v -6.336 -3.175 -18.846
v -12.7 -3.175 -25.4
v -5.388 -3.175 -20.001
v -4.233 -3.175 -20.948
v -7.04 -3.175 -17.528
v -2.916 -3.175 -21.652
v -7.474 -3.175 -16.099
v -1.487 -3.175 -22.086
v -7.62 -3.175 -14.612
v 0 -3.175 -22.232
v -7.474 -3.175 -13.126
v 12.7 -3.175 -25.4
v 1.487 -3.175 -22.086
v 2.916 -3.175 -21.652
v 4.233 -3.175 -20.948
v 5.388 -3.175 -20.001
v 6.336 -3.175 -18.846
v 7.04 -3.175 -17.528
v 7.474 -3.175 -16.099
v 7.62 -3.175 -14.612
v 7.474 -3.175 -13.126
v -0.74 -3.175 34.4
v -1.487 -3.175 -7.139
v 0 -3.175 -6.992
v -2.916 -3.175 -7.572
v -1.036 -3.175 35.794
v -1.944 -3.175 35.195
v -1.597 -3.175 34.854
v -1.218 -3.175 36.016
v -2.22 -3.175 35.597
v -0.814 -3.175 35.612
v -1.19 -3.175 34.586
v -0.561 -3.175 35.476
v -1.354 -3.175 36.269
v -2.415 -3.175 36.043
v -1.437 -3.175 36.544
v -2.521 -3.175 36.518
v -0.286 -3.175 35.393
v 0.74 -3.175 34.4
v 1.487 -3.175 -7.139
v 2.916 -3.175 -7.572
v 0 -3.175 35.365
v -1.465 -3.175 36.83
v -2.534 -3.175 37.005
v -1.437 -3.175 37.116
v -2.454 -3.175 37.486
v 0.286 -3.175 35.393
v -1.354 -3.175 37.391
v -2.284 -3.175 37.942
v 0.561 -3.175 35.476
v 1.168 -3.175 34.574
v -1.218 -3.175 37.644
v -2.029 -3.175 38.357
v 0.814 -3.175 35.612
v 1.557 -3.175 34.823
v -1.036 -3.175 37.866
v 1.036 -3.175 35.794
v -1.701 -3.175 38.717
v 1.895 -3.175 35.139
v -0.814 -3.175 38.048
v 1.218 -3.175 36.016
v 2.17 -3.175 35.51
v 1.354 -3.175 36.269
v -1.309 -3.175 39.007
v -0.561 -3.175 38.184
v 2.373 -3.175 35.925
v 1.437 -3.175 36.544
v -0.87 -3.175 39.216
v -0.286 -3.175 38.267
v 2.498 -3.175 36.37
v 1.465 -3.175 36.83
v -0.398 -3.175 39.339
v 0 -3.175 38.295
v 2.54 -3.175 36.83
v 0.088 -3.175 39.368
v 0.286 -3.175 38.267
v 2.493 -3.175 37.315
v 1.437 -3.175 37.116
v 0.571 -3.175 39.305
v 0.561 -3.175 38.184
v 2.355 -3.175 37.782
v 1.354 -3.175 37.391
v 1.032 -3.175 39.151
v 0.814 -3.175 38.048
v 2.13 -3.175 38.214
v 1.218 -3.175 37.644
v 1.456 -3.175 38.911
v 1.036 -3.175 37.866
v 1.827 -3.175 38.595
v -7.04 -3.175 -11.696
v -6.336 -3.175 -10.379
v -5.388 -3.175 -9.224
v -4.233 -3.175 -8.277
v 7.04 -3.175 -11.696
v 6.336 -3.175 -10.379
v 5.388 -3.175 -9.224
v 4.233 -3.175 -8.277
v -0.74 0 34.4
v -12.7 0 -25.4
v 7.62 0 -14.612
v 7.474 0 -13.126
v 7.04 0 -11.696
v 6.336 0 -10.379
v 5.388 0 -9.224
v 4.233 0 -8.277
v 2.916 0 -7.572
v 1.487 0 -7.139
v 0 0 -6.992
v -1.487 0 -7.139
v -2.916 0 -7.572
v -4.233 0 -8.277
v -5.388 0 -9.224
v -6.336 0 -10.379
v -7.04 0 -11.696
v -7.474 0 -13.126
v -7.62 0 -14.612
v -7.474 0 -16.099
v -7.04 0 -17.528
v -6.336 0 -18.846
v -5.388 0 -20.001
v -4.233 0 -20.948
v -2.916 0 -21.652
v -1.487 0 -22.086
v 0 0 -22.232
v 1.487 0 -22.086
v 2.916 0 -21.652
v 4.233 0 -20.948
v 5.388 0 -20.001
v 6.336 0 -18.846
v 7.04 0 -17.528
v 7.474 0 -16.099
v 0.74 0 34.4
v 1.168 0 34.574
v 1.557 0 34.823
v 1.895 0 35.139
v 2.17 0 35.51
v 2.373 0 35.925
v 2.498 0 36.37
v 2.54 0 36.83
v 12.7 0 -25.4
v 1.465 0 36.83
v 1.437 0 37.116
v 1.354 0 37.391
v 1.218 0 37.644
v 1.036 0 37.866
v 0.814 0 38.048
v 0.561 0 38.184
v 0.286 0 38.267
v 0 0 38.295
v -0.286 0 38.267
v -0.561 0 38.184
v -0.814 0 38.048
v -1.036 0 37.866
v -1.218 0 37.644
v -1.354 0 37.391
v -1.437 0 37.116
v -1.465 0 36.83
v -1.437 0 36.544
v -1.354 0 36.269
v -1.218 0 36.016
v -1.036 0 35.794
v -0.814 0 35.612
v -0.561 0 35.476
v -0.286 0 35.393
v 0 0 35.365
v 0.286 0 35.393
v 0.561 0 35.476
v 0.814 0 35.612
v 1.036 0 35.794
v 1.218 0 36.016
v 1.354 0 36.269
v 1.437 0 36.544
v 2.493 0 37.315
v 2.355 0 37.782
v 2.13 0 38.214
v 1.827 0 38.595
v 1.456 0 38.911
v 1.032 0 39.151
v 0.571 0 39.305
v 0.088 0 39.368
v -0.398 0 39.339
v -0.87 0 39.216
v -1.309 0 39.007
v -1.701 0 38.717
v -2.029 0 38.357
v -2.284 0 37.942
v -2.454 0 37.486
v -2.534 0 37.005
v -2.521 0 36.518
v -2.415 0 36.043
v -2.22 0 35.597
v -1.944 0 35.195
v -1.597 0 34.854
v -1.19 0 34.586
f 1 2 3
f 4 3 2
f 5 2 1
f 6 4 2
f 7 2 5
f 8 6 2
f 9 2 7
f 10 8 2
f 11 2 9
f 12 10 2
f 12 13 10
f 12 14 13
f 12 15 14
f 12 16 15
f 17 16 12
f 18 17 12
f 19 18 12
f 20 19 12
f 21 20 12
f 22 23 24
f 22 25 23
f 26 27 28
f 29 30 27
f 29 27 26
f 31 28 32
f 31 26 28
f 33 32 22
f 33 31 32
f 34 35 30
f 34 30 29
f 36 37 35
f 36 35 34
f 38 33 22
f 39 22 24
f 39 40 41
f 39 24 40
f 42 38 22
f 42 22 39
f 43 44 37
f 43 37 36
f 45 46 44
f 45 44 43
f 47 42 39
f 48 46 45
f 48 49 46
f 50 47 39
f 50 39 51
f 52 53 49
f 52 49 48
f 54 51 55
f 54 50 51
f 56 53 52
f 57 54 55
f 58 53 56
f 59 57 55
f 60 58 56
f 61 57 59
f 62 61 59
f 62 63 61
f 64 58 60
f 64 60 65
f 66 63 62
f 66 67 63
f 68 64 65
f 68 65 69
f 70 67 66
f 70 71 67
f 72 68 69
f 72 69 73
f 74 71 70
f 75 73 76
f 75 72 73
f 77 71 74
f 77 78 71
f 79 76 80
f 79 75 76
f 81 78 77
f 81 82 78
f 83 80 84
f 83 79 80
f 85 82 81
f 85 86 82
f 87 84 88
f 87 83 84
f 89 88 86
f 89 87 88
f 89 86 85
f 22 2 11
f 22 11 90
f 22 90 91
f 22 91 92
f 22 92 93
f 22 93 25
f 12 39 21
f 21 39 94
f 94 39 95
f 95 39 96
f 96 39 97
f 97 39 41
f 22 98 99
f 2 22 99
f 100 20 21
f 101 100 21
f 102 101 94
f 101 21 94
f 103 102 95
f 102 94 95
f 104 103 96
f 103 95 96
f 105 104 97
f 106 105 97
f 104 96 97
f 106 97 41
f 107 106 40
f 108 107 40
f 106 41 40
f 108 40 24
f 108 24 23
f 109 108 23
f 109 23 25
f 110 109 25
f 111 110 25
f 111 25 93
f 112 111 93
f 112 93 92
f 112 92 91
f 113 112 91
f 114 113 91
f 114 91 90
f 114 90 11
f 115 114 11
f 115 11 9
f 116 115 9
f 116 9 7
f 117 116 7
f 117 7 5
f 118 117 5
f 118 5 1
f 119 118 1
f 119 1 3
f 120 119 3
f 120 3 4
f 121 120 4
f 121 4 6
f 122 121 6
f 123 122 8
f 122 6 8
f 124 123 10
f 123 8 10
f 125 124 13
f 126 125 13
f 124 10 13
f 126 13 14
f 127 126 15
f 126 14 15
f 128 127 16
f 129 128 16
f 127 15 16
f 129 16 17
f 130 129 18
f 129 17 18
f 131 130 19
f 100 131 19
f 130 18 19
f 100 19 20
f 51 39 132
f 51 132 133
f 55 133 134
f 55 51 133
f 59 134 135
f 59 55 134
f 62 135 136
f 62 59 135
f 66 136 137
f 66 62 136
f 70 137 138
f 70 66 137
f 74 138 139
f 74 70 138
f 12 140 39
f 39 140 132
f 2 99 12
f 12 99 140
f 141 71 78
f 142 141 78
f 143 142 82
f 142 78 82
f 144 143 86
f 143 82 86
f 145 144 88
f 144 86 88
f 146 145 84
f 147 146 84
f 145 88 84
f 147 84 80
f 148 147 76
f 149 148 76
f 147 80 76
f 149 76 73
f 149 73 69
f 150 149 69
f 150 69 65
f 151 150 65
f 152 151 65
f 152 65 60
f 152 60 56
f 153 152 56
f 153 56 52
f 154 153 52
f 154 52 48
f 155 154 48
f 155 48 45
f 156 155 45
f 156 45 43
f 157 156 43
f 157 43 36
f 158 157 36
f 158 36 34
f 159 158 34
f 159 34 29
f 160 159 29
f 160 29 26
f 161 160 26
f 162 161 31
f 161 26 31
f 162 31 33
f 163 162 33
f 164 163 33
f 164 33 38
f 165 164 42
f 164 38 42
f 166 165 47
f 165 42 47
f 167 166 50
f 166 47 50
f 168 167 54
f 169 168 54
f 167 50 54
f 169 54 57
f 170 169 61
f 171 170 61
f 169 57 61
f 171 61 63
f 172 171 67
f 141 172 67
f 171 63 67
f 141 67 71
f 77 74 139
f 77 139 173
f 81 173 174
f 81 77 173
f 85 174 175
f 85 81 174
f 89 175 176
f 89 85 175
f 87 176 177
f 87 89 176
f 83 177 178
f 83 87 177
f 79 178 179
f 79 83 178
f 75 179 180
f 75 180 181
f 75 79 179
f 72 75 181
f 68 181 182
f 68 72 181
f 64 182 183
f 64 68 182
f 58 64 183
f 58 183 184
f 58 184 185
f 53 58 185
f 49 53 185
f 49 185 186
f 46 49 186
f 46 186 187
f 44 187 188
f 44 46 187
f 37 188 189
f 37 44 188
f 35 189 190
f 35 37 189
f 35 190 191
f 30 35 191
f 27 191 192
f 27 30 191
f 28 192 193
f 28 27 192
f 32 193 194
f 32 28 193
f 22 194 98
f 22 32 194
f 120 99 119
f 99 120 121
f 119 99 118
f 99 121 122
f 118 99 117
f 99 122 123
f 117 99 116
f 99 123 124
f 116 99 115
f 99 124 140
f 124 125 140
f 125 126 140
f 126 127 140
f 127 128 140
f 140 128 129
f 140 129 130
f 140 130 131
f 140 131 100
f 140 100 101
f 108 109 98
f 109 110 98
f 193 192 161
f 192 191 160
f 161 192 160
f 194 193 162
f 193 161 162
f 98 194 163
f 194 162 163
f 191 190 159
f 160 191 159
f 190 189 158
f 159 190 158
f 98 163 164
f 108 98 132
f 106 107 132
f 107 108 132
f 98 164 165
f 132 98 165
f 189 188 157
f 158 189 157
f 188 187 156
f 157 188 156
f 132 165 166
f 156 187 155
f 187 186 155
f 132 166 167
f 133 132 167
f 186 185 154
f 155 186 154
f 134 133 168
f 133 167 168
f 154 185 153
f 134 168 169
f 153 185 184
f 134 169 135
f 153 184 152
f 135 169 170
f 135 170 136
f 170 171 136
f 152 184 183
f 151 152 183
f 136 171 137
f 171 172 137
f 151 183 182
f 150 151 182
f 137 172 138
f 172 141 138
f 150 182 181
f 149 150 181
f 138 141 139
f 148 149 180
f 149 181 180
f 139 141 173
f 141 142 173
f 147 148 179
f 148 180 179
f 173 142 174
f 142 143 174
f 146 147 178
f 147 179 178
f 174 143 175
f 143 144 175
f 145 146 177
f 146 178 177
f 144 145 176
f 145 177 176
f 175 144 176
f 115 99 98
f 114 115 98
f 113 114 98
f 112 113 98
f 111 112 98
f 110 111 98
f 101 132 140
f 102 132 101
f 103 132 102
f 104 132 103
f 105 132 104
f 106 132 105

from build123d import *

# Parameters (mm, degrees)
F1_DEPTH = 3.175
F2_R     = 7.62
F3_DEPTH = 3.176
F5_DEPTH = 3.175
F6_R     = 1.4652480926
F7_DEPTH = 3.176


with BuildPart() as f1:
    # F0 (on Front) → F1 (new body)
    with BuildSketch(Plane.XZ):
        Polygon((12.7, -25.4), (0, 38.1), (-12.7, -25.4), align=None)
    extrude(amount=F1_DEPTH)

    # F2 (on face) → F3 (cut, through all)
    with BuildSketch(Plane.XZ.offset(3.175)):
        with Locations((0, -14.6123587166)):
            Circle(F2_R)
    extrude(amount=-F3_DEPTH, mode=Mode.SUBTRACT)

    # F4 (on face) → F5 (join, through all)
    with BuildSketch(Plane.XZ.offset(3.175)):
        with BuildLine():
            ThreePointArc((0.739965088, 34.4001745601), (2.0409692947, 35.3180329573), (2.54, 36.83))
            ThreePointArc((2.54, 36.83), (-1.5119670427, 38.8709692947), (-0.739965088, 34.4001745601))
            Line((-0.739965088, 34.4001745601), (0, 38.1))
            Line((0, 38.1), (0.739965088, 34.4001745601))
        make_face()
    extrude(amount=-F5_DEPTH)

    # F6 (on face) → F7 (cut, through all)
    with BuildSketch(Plane.XZ.offset(3.175)):
        with Locations((0, 36.83)):
            Circle(F6_R)
    extrude(amount=-F7_DEPTH, mode=Mode.SUBTRACT)


solid = f1.part
